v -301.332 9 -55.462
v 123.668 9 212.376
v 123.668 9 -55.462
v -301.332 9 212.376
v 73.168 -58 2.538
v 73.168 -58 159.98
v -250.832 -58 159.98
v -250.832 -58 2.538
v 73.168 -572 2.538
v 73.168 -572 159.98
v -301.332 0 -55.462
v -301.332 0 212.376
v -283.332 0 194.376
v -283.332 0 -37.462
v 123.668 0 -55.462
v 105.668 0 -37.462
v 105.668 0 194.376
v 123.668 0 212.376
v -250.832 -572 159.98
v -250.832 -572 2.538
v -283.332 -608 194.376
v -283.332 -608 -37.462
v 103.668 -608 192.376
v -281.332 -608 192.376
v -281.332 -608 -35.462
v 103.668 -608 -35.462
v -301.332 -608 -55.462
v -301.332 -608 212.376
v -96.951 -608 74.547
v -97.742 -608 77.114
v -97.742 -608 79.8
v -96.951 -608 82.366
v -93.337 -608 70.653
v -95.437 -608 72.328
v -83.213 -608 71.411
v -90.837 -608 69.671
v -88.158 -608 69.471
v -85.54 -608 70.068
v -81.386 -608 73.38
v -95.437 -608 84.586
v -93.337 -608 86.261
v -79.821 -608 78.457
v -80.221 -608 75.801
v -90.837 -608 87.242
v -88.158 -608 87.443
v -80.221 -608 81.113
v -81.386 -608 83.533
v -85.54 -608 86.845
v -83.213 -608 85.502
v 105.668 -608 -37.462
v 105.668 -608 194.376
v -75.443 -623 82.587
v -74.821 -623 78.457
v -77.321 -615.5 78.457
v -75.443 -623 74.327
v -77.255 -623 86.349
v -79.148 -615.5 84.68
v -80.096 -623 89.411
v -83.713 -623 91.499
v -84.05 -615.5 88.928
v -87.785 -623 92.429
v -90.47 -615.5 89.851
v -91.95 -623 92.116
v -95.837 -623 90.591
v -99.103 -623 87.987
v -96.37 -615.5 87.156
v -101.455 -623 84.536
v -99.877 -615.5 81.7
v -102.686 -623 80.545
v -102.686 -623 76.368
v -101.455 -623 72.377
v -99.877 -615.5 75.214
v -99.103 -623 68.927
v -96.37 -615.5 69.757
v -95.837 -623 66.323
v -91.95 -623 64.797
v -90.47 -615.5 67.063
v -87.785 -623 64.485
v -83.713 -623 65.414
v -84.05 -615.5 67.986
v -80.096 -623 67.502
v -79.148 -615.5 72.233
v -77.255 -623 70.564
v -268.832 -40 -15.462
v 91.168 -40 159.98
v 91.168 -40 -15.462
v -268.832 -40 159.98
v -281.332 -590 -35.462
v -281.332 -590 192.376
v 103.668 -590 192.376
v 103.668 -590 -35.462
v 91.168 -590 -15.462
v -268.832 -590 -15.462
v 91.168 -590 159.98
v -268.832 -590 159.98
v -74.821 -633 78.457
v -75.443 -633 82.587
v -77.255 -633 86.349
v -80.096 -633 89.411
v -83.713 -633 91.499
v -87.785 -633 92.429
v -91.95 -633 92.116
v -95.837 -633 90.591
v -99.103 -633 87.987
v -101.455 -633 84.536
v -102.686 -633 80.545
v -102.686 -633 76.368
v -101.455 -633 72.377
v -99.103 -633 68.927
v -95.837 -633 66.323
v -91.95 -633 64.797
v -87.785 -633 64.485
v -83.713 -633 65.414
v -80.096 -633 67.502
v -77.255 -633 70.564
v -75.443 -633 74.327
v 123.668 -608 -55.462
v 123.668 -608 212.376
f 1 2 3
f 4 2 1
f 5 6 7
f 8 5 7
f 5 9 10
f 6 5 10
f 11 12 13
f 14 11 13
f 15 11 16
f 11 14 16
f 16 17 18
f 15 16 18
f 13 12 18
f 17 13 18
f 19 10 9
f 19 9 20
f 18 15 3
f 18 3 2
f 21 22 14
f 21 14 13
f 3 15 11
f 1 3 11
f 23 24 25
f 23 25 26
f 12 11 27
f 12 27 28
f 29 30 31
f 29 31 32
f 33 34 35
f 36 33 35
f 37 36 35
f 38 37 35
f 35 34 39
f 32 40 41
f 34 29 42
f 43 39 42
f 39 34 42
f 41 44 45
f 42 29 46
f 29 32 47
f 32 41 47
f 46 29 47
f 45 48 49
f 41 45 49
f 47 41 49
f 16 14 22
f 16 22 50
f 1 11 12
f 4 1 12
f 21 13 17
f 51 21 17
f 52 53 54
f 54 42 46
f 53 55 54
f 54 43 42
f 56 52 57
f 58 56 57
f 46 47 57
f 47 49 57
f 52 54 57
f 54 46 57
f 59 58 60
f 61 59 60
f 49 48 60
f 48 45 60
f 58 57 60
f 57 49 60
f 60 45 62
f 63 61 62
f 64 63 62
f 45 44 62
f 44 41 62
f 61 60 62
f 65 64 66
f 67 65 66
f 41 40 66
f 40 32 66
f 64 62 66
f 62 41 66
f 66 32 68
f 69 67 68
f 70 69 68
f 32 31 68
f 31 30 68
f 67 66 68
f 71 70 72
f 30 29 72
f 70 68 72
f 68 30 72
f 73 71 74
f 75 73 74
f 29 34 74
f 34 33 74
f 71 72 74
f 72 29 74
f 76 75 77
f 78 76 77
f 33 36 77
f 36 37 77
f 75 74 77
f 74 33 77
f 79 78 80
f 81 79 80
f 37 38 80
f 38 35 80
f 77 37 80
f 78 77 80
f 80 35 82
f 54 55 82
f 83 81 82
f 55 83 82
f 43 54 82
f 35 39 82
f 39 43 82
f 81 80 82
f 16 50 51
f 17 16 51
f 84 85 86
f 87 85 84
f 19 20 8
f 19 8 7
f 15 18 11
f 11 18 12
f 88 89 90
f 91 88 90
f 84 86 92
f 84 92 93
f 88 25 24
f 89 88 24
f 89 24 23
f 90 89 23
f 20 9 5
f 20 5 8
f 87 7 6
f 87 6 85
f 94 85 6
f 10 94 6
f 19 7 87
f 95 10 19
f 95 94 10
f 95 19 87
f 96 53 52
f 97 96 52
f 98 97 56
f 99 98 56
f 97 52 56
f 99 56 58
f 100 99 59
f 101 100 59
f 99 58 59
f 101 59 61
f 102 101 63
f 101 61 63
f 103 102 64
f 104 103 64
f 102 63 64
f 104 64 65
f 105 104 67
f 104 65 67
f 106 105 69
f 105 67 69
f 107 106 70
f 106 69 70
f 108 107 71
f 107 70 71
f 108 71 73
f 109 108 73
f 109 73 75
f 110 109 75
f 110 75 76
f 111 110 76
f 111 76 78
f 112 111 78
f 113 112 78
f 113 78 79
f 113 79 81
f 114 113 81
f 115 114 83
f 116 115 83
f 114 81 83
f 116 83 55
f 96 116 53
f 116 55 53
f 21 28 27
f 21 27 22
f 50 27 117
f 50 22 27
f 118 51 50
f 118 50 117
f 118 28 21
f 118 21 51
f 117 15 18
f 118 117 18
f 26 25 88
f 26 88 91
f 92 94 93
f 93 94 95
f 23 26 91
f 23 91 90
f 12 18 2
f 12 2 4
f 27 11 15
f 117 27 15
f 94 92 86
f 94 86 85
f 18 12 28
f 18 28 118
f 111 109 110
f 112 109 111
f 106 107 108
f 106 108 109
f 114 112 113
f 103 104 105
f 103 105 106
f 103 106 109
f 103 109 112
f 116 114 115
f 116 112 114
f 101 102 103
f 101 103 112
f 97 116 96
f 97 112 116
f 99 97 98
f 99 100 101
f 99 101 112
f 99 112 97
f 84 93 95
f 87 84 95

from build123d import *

# Parameters (mm, degrees)
F0_W      = 425
F0_H      = 267.837838
F0_W_2    = 389
F0_H_2    = 231.837838
F1_DEPTH  = 608
F2_W      = 425
F2_H      = 267.837838
F3_DEPTH  = 9
F4_W      = 385
F4_H      = 227.837838
F5_DEPTH  = 18
F6_W      = 360
F6_H      = 175.442627
F7_DEPTH  = 550
F8_T      = -18
F9_R      = 14.011135
F10_DEPTH = 25
F11_SIZE2 = 5
F11_SIZE  = 15


with BuildPart() as f1:
    # F0 (on Front) → F1 (new body)
    with BuildSketch(Plane.XZ):
        with Locations((-88.831797, 78.456648)):
            Rectangle(F0_W, F0_H)
        with Locations((-88.831797, 78.456648)):
            Rectangle(F0_W_2, F0_H_2, mode=Mode.SUBTRACT)
    extrude(amount=F1_DEPTH)


with BuildPart() as f3:
    # F2 (on face) → F3 (new body)
    with BuildSketch(Plane(origin=(0, 0, 0), x_dir=(-1, 0, 0), z_dir=(0, 1, 0))):
        with Locations((88.831797, 78.456648)):
            Rectangle(F2_W, F2_H)
    extrude(amount=F3_DEPTH)


with BuildPart() as f5:
    # F4 (on face) → F5 (new body)
    with BuildSketch(Plane.XZ.offset(608)):
        with Locations((-88.831797, 78.456648)):
            Rectangle(F4_W, F4_H)
    extrude(amount=-F5_DEPTH)


with BuildPart() as f7:
    # F6 (on face) → F7 (new body)
    with BuildSketch(Plane(origin=(0, -590, 0), x_dir=(-1, 0, 0), z_dir=(0, 1, 0))):
        with Locations((88.831797, 72.259043)):
            Rectangle(F6_W, F6_H)
    extrude(amount=F7_DEPTH)

    # F8
    f8_openings = [f7.faces().sort_by_distance(p)[0] for p in [
        (-88.831797, -315, 159.980356),
    ]]
    offset(amount=F8_T, openings=f8_openings)


with BuildPart() as f10:
    # F9 (on face) → F10 (new body)
    with BuildSketch(Plane.XZ.offset(608)):
        with Locations((-88.831797, 78.456648)):
            Circle(F9_R)
    extrude(amount=F10_DEPTH)

    # F11
    f11_edges = [f10.edges().sort_by_distance(p)[0] for p in [
        (-102.842932, -608, 78.456648),
    ]]
    chamfer(f11_edges, length=F11_SIZE, length2=F11_SIZE2)


solid = Compound([f1.part, f3.part, f5.part, f7.part, f10.part])
